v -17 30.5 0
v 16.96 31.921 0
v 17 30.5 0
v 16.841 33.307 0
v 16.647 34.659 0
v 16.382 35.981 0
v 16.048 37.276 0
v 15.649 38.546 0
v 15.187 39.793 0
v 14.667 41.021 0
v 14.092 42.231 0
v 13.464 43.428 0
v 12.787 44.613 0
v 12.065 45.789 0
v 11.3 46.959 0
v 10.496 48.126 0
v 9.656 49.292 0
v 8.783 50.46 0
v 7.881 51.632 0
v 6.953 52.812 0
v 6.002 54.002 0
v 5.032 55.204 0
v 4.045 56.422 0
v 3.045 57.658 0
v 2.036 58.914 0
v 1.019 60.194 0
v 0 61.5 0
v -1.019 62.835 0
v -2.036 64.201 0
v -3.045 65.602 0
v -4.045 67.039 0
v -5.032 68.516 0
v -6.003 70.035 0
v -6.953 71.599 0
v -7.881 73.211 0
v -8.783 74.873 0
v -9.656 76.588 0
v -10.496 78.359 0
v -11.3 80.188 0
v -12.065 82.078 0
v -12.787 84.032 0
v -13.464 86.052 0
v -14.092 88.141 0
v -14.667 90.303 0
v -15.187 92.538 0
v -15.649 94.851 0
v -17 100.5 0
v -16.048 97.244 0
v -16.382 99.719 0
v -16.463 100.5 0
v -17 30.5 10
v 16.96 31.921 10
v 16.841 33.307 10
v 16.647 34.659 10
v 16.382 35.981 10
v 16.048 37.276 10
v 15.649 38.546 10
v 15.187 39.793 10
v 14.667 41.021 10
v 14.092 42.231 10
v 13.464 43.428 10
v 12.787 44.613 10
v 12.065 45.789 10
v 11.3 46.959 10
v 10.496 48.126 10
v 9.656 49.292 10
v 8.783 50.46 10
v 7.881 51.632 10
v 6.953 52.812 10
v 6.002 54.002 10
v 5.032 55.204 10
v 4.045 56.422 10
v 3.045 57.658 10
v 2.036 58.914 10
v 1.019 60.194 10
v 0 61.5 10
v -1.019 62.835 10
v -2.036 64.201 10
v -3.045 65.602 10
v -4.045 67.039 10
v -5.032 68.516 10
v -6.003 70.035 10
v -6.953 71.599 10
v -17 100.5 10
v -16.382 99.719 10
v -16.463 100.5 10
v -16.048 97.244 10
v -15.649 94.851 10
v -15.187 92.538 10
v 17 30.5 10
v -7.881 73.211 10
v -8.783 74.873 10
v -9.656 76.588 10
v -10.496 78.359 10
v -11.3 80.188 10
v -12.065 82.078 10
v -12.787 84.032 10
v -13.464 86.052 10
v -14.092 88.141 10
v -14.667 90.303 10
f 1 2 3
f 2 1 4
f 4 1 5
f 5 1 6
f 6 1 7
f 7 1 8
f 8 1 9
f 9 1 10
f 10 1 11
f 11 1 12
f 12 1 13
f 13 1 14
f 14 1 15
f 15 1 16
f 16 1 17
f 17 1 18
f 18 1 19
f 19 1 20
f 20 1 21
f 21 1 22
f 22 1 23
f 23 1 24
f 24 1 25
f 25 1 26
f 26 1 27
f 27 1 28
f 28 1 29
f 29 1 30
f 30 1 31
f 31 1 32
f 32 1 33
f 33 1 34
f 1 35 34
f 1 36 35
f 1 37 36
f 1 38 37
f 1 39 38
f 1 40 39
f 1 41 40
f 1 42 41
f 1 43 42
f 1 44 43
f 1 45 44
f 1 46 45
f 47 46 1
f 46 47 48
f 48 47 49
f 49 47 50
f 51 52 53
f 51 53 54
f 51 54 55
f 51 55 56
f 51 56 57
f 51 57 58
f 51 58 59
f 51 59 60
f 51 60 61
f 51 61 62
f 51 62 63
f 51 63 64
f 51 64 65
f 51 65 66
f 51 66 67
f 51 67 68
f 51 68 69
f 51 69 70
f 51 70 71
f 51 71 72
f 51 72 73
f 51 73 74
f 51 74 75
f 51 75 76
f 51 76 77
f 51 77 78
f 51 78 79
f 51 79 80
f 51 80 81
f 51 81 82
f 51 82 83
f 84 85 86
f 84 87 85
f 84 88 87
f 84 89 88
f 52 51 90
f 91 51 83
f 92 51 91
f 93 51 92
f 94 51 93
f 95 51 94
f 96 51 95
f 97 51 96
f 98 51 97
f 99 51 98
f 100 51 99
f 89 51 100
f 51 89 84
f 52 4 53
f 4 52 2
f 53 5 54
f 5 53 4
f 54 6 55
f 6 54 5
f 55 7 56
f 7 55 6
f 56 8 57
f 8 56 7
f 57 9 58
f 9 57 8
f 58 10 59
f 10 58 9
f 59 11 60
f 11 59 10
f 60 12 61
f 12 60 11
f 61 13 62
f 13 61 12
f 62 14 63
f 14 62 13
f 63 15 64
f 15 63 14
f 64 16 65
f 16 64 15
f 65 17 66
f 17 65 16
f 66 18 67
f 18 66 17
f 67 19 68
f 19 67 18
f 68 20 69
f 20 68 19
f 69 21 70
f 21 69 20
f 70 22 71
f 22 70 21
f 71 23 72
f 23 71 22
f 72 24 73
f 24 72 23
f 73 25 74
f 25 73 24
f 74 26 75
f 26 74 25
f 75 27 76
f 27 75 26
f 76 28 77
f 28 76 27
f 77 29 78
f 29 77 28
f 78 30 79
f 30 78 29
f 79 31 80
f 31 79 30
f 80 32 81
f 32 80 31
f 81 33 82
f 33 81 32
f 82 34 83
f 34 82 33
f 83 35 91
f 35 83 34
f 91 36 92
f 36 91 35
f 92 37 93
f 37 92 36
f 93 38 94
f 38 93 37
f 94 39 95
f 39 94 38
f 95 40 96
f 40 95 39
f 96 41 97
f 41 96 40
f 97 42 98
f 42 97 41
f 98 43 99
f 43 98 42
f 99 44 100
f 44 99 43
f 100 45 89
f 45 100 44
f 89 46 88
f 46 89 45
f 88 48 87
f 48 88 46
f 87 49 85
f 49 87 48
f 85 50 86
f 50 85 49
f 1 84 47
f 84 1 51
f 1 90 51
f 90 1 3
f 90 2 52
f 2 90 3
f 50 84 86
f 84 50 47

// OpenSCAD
// file: ../../../../src/gate/interparts/upright_base_level1.scad
include <../../../config/parameters.scad>

module upright_base_level1() {
    w = upright_base_w;
    l = upright_base_l;
    h = upright_base_h;

    translate([-w/2, -l/2, 0])
    minkowski() {
        cube([w, l, h]);
        cylinder(r = base_curvature_r, h = fix);
    }
}

function upright_base_level1_w() = upright_base_w+base_curvature_r*2;
function upright_base_level1_l() = upright_base_l+base_curvature_r*2;
// file: ../../../../src/gate/modules/profile.scad
include <../../../config/parameters.scad>

function profile_outer_w(w=bar_w) = w/profile_w*profile_h*2+w;
function profile_inner_w(w=bar_w) = w;
function profile_w_diff(w=bar_w) = profile_outer_w(w)-profile_inner_w(w);

module profile(w = bar_w) {
    w1 = profile_w;
    s = 6;
    h = profile_h;
    a = 50;
    k = 2.5;

    w2 = 17.5;


    x0 = s/2;
    y0 = w1/2;

    x1 = s/2+cos(a)*h;
    y1 = w1/2+h;

    x2 = s/2+cos(a)*h+k;
    y2 = w1/2+h;

    x3 = w2/2;
    y3 = w2/2;


    scale([w/w1, w/w1])
    polygon([
        [x0,y0],
        [x1,y1],
        [x2,y2],

        [x3,y3],

        [y2,x2],
        [y1,x1],
        [y0,x0],
        [y0,-x0],
        [y1,-x1],
        [y2,-x2],

        [y3,-x3],

        [x2,-y2],
        [x1,-y1],
        [x0,-y0],
        [-x0,-y0],
        [-x1,-y1],
        [-x2,-y2],

        [-x3,-y3],

        [-y2,-x2],
        [-y1,-x1],
        [-y0,-x0],
        [-y0,x0],
        [-y1,x1],
        [-y2,x2],

        [-y3,x3],

        [-x2,y2],
        [-x1,y1],
        [-x0,y0],
    ]);
}
// file: ../../../../src/basement/bezier.scad
function deltat() = 0.02;

function slice_list(list,start,length) =
    is_undef(length)?[for (i = [start:len(list)-1]) list[i]]:
        length==0?[]:
        start+length>=len(list)?[for (i = [start:len(list)-1]) list[i]]:
            [for (i = [start:start+length-1]) list[i]];

function cubic_bezier(p0,p1,p2,p3) =
    let (points = [for (t=[0:deltat():1+deltat()]) pow(1-t,3)*p0+3*pow((1-t),2)*t*p1+3*(1-t)*pow(t,2)*p2+pow(t,3)*p3])
    slice_list(points, 0, len(points)-1);

function project_point(pa, pb) =
    [for (i = [0:1]) pb[i]+(pb[i]-pa[i])];


module line(p1,p2,w) {
    hull() {
        translate(p1) circle(r=w,$fn=20);
        translate(p2) circle(r=w,$fn=20);
    }
}

module polyline(points, w=1) {
    for(i=[0:len(points)-2]) {
        line(points[i], points[i+1],w);
    }
}
// file: ../../../../src/gate/interparts/basement_upright.scad
include <../../../config/parameters.scad>
use <../../gate/interparts/upright_base_level1.scad>

function basement_upright_margin() = basement_upright_margin;
function basement_w() = upright_base_level1_w() + basement_upright_margin * 2;
function basement_l() = upright_base_level1_l() + basement_upright_margin * 2;
// file: ../../../../src/gate/interparts/upright_base_hole.scad
include <../../../config/parameters.scad>
use <../../gate/modules/profile.scad>

module upright_base_hole(void=true) {
    play = void?0:upright_base_hole_play;
    hole_side = pylon_side-base_curvature_r*2-profile_outer_w()-base_hole_margin;

    color("blue")
    translate([-hole_side/2,-hole_side/2,-fix])
    minkowski() {
        cube([hole_side, hole_side, a_lot]);
        cylinder(r=base_curvature_r-play, h=fix);
    }
}
// file: ../../../../config/parameters.scad
$fn=100;
fix = 0.01;
fix2 = 0.1;
a_lot = 1000;
a_few = 10;
play = 0.25;
play2 = 0.15;
play3 = 0.20;
    layer_h = 0.15;
    layer_w = 0.46;
min_space = 0.198;

profile_w = 20;
profile_h = 2;

base_curvature_r = 2;

upright_base_w = 20;
upright_base_l = 47;
upright_base_h = 2.5;

angle_base_w = 20;
angle_base_l = 25;
angle_base_h = 2.5;
angle_base_h2_c = 0.5;

base_hole_margin = 0.3;

pylon_side = 13;

bar_w = 4;

bolt_d=6;
bolt_h=4;


reinforcement_gap = 5;
//reinforcement_gap = -5;

startline_l = 160; //80; //160; //270;
startline_l_160mm = 160;
startline_l_270mm = 270;

upright_h = 90; //40; //90;

upright_base_groove_thick = min_space;
upright_base_groove_depth = layer_h*2;
upright_base_hole_play = 0.15;

basement_upright_margin = 5;
basement_h = 10;
basement_deflector_l = 80;


traverse_play = play2;

traverse_hook_l = 8;
traverse_hook_w = 2;
traverse_hook_thick = 0.8;
traverse_hooks_intra_space_l = 30;

bar_wrapper_w = 3;
bar_wrapper_thick = 1.2;
bar_wrapper_play = play2;

traverse_bar_wrappers_intra_space_l = (reinforcement_gap+pylon_side)*2;

ct_slide_side = 7;
ct_slide_play = play3;

v_slide_play = play2;

hanger_clip_junction_w = 2;
hanger_clip_junction_l = 4;

hanger_clip_generic_w = 5;

bolt_joint_play = 0.15;

stick_void_l_margin = 0.5;
stick_d = 2;
stick_play = 0.15;

traverse_stick_l = 30;
traverse_stick_void_l = traverse_stick_l + stick_void_l_margin*2;

upright_angle_joint_stick_l = 15;
upright_angle_joint_stick_void_l = upright_angle_joint_stick_l + stick_void_l_margin;

upright_angle_joint_button_r = bar_w/2;
upright_angle_joint_button_play = 0.25;
upright_angle_joint_button_h = 3;
upright_angle_joint_bar_top_w = 1;
upright_angle_joint_bar_top_play = 0.15;
upright_angle_joint_bar_bottom_h = angle_base_h*angle_base_h2_c;


bolting_base_thick = 0.5;
// file: ../../../../src/basement/_basement.scad
include <../../config/parameters.scad>
use <../../src/gate/interparts/upright_base_hole.scad>
use <../../src/gate/interparts/basement_upright.scad>
use <../../src/basement/bezier.scad>

module _basement_deflector() {
    
    ratio1 = 0.3;
    ratio2 = 0.6;
    cut = 10;
    
    points = concat(
        cubic_bezier(
            [basement_w(),0],
            [basement_w(),basement_deflector_l*ratio1],
            [0,basement_deflector_l-basement_deflector_l*ratio2],
            [0,basement_deflector_l]
        ),
        [[0,0]]
    );
    
    
    translate([0, basement_l(), 0])
    translate([-basement_w() / 2, -basement_l() / 2, 0])
    intersection() {
        linear_extrude(basement_h)
        polygon(points);
        translate([0,-cut,-fix])
        cube([basement_w(),basement_deflector_l,basement_h+fix*2]);
    }
}

module _basement_deflector_L() {
    _basement_deflector();
}

module _basement_deflector_R() {
    mirror([1,0,0])
    _basement_deflector();
}

module _basement() {
    difference() {
        translate([-basement_w() / 2, -basement_l() / 2, 0])
        cube([basement_w(), basement_l(), basement_h]);
        upright_base_hole();
    }
}
// main file
use <../../../../src/basement/_basement.scad>

_basement_deflector_L();
